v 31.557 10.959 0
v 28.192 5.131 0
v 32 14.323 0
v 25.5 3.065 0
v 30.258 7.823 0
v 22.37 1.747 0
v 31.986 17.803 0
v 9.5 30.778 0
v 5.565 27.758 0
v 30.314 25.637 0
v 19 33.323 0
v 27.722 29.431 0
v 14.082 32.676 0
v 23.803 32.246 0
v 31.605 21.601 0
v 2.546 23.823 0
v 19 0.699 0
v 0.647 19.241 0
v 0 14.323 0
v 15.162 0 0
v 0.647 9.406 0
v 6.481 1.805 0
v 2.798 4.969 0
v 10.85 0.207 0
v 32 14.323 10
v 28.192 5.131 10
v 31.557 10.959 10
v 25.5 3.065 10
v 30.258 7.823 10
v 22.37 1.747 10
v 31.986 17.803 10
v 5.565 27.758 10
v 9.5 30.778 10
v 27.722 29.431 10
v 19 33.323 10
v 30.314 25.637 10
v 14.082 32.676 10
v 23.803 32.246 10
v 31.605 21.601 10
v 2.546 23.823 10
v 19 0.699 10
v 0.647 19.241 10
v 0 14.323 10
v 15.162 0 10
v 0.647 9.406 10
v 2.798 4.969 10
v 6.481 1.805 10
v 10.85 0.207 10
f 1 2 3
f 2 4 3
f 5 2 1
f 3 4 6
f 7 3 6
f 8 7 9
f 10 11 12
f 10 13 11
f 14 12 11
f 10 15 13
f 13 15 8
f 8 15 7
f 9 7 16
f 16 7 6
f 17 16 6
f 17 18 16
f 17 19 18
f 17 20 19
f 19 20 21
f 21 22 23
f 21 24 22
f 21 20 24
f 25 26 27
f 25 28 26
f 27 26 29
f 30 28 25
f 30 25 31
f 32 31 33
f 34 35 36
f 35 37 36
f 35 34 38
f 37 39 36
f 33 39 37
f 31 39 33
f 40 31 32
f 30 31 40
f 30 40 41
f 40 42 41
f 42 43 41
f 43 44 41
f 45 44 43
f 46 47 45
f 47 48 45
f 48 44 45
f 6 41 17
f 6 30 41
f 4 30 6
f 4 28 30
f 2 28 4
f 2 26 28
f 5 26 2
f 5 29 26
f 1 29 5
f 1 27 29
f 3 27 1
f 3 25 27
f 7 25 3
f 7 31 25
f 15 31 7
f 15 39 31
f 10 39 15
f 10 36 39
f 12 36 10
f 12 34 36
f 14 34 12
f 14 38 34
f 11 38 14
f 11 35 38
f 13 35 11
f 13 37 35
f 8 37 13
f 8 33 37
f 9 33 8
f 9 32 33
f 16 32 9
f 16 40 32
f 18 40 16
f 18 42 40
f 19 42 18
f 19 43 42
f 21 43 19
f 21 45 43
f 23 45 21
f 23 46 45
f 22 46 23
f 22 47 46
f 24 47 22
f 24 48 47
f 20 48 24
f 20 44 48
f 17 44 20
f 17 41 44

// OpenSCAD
$fn = 32;

// ----------------------------------------------------------------------
// Cam disc: base radius 13.0 mm, lift 6.0 mm, 24 profile points
// ----------------------------------------------------------------------

// --- parameters (mm) ---
profile_height = 10;      // extrusion height
profile_points = 24;      // points of the closed outline

profile = [[32, 14.323], [31.986, 17.803], [31.605, 21.601], [30.314, 25.637], [27.722, 29.431], [23.803, 32.246], [19, 33.323], [14.082, 32.676], [9.5, 30.778], [5.565, 27.758], [2.546, 23.823], [0.647, 19.241], [0, 14.323], [0.647, 9.406], [2.798, 4.969], [6.481, 1.805], [10.85, 0.207], [15.162, 0], [19, 0.699], [22.37, 1.747], [25.5, 3.065], [28.192, 5.131], [30.258, 7.823], [31.557, 10.959]];  // single closed polygon, 24 points, counter clockwise

// --- the one profile operation ---
linear_extrude(height = profile_height) polygon(points = profile);
